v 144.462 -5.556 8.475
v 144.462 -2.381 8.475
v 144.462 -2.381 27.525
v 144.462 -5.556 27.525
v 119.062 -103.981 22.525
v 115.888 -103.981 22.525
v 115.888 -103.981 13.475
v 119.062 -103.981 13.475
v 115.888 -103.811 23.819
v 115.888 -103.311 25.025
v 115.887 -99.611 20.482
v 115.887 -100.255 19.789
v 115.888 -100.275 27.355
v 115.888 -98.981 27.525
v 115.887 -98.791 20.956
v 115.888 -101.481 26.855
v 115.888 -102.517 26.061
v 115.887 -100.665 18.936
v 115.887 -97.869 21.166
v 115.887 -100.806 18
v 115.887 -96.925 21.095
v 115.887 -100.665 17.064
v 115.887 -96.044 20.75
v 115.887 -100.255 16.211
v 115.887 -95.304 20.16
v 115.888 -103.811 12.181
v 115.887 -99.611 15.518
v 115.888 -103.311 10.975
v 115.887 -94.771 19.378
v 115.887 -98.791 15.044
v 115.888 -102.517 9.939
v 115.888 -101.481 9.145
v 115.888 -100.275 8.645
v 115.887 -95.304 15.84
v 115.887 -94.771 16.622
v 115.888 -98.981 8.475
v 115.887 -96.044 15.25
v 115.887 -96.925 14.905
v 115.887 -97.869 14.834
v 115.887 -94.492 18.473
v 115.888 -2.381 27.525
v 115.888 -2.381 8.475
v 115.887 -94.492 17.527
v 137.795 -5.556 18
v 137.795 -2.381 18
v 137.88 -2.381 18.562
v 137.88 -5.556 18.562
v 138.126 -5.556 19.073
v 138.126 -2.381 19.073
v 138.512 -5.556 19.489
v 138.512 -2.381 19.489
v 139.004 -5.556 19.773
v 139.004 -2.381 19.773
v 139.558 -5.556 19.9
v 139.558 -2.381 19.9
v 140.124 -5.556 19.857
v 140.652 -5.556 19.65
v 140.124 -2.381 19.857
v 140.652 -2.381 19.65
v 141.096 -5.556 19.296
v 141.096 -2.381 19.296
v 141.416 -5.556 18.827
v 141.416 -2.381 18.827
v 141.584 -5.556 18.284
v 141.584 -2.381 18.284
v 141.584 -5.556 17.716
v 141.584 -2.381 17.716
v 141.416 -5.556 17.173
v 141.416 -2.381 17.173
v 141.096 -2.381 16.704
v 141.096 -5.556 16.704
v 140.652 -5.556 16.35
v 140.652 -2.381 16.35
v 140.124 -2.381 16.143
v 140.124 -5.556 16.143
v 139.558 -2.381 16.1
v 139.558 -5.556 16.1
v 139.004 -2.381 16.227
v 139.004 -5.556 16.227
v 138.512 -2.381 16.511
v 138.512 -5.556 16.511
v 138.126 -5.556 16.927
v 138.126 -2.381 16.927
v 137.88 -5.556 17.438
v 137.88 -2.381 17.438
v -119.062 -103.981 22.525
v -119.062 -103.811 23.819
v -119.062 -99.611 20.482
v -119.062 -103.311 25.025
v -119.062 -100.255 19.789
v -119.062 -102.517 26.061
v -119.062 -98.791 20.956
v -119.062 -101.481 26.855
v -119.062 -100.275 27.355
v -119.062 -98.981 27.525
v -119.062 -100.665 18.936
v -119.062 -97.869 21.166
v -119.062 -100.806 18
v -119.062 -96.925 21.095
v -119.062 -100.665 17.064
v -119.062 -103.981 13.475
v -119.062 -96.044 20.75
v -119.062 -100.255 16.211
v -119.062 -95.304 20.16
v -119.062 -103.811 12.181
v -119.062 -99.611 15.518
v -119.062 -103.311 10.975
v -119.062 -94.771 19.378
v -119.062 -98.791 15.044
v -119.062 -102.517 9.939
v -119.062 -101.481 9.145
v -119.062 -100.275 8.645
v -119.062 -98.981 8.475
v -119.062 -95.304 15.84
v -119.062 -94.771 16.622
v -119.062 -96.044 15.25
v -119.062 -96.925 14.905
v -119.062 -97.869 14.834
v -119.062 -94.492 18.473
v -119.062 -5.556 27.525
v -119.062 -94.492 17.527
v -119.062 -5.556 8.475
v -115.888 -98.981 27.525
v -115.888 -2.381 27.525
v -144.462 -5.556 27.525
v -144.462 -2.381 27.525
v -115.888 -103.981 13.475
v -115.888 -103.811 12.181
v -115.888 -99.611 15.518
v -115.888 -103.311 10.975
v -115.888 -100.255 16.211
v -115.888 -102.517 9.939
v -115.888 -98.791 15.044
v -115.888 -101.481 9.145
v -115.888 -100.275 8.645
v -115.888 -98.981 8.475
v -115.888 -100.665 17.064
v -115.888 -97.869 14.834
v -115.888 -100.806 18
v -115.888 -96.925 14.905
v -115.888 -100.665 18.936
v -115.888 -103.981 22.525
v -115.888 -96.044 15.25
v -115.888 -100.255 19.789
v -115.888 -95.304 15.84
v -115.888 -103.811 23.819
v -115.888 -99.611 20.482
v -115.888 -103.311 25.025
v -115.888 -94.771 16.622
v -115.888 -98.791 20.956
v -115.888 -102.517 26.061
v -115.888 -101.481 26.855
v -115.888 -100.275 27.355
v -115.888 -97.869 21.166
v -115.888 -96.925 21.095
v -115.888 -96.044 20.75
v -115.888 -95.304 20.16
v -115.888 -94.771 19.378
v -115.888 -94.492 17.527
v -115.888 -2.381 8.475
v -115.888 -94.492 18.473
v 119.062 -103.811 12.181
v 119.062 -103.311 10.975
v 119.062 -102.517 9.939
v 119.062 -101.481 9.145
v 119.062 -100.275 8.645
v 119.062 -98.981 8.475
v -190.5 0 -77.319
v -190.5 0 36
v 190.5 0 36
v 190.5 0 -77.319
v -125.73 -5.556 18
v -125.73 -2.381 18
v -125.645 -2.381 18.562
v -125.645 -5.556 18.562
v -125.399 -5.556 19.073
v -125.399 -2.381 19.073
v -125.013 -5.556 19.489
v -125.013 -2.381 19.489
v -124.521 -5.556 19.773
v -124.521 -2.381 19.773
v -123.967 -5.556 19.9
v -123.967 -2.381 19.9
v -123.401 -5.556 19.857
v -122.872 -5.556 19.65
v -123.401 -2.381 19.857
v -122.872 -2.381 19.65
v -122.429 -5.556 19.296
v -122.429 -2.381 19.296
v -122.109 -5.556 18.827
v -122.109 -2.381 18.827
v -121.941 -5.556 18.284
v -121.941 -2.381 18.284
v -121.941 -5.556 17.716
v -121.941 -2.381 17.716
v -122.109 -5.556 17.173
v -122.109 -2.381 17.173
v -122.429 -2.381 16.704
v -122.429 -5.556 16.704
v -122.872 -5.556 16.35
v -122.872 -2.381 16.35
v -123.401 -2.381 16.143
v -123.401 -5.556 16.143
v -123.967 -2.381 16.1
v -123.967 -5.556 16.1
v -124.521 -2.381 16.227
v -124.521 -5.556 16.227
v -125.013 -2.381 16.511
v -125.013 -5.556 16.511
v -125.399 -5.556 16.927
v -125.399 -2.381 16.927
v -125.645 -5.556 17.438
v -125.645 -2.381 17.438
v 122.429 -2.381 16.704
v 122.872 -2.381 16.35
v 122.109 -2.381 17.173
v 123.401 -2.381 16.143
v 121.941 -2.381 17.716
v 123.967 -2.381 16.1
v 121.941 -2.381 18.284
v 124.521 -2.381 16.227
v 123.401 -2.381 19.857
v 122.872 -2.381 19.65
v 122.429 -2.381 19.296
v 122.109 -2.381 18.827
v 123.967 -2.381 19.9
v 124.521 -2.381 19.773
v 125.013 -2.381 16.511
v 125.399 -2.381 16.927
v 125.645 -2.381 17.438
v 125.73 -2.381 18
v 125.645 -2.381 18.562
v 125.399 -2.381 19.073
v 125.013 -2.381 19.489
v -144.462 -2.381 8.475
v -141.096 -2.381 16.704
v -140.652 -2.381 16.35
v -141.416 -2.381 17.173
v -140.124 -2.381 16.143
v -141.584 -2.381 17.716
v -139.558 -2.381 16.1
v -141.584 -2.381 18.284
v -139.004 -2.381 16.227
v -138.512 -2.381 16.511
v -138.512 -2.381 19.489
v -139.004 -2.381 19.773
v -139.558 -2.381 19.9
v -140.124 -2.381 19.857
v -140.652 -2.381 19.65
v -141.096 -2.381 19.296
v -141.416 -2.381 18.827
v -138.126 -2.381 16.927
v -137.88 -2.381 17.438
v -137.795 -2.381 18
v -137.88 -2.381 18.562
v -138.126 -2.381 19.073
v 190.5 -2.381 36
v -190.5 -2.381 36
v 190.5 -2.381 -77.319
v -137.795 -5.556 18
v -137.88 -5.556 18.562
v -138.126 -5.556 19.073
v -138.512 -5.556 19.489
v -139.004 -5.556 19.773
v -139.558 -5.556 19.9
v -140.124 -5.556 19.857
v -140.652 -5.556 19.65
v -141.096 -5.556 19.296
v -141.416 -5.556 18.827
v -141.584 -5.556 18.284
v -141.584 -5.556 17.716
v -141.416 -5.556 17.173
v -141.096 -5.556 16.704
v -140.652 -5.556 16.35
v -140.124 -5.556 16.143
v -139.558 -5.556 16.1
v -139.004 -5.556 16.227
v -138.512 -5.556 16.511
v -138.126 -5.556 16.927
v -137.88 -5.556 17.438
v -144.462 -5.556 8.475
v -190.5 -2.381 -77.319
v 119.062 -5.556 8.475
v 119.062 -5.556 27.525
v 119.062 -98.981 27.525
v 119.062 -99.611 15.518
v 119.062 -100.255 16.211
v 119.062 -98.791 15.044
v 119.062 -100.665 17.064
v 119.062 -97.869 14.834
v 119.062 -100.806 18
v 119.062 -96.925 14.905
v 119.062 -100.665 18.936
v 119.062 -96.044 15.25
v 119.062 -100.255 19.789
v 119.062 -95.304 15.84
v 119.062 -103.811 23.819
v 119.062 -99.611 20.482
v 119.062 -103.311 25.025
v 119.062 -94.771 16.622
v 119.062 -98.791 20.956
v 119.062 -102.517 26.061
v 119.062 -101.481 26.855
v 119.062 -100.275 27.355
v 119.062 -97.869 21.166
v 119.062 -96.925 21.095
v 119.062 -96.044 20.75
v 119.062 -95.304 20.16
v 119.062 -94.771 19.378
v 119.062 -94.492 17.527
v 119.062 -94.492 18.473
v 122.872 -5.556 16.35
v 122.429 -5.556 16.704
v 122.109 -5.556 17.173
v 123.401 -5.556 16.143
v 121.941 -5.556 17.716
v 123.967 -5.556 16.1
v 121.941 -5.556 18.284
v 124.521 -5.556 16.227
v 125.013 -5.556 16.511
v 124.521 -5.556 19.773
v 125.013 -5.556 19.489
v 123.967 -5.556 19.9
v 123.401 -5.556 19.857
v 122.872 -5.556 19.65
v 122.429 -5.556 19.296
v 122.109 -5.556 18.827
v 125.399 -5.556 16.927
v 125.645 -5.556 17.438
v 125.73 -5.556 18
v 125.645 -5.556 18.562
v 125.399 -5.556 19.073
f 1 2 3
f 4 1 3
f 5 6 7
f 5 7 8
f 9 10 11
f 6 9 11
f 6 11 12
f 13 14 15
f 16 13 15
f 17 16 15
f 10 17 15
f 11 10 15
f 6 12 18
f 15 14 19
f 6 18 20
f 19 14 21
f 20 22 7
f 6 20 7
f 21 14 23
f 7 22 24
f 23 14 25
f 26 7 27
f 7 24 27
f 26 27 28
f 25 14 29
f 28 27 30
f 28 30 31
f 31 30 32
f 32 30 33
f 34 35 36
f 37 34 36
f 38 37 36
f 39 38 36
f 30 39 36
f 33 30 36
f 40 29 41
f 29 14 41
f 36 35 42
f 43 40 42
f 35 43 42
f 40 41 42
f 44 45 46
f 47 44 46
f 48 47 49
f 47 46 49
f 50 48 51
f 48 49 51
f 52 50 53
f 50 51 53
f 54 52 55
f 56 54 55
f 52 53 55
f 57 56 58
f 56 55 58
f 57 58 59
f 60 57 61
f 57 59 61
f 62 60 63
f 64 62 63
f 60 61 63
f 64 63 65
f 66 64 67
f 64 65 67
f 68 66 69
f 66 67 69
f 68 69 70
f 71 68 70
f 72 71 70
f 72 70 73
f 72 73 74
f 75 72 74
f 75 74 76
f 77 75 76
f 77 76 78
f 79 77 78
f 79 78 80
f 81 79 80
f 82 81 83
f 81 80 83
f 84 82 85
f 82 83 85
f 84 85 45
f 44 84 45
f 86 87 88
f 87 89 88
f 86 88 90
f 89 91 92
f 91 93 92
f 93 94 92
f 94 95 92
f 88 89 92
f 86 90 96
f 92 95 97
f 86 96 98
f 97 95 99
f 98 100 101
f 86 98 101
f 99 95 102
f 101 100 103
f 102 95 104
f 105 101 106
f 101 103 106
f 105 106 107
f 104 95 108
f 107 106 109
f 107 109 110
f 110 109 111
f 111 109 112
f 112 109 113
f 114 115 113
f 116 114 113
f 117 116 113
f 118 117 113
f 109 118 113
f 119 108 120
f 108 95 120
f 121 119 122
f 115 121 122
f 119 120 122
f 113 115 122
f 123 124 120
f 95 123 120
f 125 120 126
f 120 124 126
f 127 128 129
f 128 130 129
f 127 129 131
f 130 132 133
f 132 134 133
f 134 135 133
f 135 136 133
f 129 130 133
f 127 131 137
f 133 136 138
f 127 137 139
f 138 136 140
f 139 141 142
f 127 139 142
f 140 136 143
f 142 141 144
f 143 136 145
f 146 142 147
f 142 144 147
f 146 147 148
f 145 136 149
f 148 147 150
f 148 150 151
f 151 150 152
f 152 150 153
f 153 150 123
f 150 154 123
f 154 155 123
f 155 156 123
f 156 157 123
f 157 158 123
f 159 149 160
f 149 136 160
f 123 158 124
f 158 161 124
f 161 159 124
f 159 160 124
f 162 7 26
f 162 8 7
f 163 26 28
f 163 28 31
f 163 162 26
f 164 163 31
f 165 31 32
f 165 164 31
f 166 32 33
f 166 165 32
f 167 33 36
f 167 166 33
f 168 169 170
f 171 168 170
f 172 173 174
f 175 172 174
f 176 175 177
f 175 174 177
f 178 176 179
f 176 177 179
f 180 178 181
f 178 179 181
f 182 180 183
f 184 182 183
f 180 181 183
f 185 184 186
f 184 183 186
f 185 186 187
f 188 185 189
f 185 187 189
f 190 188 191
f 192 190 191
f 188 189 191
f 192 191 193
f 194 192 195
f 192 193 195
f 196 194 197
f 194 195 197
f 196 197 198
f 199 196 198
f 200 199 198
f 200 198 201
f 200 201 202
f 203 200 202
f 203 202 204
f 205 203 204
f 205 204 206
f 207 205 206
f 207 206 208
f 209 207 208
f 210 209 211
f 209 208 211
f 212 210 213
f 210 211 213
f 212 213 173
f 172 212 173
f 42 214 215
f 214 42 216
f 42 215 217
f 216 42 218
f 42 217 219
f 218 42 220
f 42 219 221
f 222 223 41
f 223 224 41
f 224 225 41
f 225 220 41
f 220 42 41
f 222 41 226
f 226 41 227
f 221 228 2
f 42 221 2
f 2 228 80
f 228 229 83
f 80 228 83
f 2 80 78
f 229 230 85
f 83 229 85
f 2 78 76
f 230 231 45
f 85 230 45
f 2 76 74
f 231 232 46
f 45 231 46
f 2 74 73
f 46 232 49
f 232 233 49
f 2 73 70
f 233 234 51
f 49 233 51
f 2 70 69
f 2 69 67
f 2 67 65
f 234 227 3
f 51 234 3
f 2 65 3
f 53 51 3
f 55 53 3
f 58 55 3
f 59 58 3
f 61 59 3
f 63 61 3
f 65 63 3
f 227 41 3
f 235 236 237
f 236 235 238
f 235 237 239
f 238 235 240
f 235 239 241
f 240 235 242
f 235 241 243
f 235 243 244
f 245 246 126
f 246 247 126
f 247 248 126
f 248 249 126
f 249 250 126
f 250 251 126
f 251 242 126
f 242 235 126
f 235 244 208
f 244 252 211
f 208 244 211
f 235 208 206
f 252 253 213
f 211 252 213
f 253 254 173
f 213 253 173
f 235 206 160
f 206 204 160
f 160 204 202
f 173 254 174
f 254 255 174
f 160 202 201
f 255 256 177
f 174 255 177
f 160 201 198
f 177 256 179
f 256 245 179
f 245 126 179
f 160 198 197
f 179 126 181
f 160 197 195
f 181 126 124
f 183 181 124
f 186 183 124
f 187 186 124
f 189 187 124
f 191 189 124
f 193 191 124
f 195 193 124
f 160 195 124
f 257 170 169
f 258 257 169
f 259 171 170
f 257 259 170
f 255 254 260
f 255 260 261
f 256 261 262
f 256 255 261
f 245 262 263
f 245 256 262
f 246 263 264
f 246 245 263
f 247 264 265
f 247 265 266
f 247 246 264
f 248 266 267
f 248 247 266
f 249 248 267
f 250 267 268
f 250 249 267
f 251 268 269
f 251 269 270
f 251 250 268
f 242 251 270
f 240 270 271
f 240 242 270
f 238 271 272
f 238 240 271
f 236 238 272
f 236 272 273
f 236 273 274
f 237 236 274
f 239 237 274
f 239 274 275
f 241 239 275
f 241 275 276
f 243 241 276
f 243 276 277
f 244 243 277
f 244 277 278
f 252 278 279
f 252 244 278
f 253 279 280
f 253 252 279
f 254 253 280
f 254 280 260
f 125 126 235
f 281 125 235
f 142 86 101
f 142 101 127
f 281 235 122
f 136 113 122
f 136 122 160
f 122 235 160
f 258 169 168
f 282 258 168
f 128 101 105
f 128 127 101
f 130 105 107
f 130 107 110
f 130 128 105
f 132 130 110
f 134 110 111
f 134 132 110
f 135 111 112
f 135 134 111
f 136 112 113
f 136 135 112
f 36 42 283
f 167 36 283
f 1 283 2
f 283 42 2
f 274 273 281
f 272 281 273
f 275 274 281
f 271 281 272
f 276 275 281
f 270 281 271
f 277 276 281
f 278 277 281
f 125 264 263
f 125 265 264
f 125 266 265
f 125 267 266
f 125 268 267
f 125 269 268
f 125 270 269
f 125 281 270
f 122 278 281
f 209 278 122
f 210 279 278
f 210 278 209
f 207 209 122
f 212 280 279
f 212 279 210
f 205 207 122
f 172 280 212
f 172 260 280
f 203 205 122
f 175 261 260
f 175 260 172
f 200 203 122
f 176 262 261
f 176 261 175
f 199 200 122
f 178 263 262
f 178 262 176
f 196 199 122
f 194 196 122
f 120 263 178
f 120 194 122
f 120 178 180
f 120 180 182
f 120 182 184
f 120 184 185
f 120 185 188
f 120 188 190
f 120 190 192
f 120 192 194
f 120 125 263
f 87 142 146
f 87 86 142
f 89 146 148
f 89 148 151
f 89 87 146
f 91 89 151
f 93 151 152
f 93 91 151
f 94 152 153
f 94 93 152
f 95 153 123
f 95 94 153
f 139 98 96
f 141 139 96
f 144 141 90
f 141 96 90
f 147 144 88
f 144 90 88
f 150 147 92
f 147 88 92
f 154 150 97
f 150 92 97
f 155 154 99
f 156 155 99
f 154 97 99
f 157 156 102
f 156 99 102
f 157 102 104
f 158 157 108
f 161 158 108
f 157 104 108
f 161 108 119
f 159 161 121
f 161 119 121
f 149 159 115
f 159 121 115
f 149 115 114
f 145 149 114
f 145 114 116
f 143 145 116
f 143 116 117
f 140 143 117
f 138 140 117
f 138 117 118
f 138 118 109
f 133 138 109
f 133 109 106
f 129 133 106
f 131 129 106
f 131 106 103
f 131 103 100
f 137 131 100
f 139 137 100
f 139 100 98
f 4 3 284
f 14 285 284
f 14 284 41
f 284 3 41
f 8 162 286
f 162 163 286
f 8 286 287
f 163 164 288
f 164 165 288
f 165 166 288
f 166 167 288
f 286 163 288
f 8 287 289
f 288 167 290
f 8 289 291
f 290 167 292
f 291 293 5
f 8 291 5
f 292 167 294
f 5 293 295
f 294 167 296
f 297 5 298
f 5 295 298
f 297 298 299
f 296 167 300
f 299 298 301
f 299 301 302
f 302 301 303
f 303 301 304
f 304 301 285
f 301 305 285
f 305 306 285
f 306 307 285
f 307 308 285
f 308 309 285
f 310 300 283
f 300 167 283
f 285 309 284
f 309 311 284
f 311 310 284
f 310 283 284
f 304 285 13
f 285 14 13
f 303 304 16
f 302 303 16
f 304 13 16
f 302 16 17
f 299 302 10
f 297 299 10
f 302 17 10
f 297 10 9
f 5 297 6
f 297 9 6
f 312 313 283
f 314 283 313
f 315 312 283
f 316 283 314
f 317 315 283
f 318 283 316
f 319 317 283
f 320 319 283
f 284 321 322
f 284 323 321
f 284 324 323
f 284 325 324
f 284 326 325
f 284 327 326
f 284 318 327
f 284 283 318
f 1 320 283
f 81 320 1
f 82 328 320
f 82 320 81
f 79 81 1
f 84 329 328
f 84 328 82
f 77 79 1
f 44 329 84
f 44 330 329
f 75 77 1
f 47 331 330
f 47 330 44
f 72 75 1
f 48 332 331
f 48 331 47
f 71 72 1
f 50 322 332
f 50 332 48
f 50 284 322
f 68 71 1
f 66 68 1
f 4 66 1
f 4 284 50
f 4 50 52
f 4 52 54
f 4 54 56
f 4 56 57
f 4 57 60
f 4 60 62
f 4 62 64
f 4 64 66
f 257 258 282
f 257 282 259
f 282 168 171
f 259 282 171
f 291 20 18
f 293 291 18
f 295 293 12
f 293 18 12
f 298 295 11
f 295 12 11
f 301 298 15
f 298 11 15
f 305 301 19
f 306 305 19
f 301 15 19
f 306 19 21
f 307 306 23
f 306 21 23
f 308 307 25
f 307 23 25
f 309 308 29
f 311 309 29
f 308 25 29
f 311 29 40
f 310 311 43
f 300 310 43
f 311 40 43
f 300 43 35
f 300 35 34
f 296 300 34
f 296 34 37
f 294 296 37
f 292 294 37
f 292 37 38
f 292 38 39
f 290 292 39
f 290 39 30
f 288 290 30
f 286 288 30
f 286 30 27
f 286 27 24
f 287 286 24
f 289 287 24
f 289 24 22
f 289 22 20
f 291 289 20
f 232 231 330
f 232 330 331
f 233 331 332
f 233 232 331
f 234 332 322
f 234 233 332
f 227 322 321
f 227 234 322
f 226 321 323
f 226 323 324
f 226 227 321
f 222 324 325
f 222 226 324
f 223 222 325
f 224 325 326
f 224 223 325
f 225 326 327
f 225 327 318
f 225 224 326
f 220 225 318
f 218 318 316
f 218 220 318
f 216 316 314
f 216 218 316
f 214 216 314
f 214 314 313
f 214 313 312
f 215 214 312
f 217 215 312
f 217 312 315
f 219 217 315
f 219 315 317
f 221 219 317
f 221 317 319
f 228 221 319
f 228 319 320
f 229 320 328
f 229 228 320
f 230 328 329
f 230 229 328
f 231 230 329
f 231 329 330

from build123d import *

# Parameters (mm, degrees)
F1_DEPTH  = 2.38125
F3_DEPTH  = 101.6
F5_DEPTH  = 25000
F6_R      = 5
F7_R      = 5
F8_R      = 5
F9_R      = 1.905
F10_DEPTH = 3.175


# Not quite as in the source:
# - a length typed as a fraction of an inch, garbled in the dataset ("3 / 203.2 mm" for 3/8 in), is restored


with BuildPart() as f1:
    # F0 (on Front) → F1 (new body)
    with BuildSketch(Plane.XZ):
        Polygon((190.5, -36), (190.5, 36), (-190.5, 36), (-190.5, -36), (-190.5, -77.319), (190.5, -77.319), align=None)
    extrude(amount=F1_DEPTH)


with BuildPart() as f3:
    # F2 (on face) → F3 (new body)
    with BuildSketch(Plane.XZ.offset(2.38125)):
        Polygon((115.8875, 27.525), (115.8875, 18), (115.8875, 8.475), (119.0625, 8.475), (119.0625, 18), (119.0625, 27.525), align=None)
    extrude(amount=F3_DEPTH)


with BuildPart() as f3b:
    # F2 (on face) → F3, piece 2 (new body)
    with BuildSketch(Plane.XZ.offset(2.38125)):
        Polygon((-115.8875, 8.475), (-115.8875, 18), (-115.8875, 27.525), (-119.0625, 27.525), (-119.0625, 18), (-119.0625, 8.475), align=None)
    extrude(amount=F3_DEPTH)


with BuildPart() as f5_tool:
    # F4 (on face) → F5 (new body)
    with BuildSketch(Plane(origin=(-119.0625, 0, 0), x_dir=(0, -1, 0), z_dir=(-1, 0, 0))):
        with BuildLine():
            ThreePointArc((94.45625, 18), (97.63125, 14.825), (100.80625, 18))
            ThreePointArc((100.80625, 18), (97.63125, 21.175), (94.45625, 18))
        make_face()
    extrude(amount=-F5_DEPTH)


with BuildPart() as f3_1:
    add(f3.part)

    # F5: cut by f5_tool
    add(f5_tool.part, mode=Mode.SUBTRACT)

    # F8
    f8_edges = [f3_1.edges().sort_by_distance(p)[0] for p in [
        (117.475, -103.98125, 27.525),
        (117.475, -103.98125, 8.475),
    ]]
    fillet(f8_edges, radius=F8_R)

    # F9 (on face) → F10, piece 2 (join)
    with BuildSketch(Plane.XZ.offset(2.38125)):
        Polygon((119.0625, 18), (119.0625, 8.475), (131.7625, 8.475), (131.7625, 18), (131.7625, 27.525), (119.0625, 27.525), align=None)
        with Locations((123.825, 18)):
            Circle(F9_R, mode=Mode.SUBTRACT)
        Polygon((131.7625, 18), (131.7625, 8.475), (144.4625, 8.475), (144.4625, 27.525), (131.7625, 27.525), align=None)
        with BuildLine():
            ThreePointArc((141.605, 18), (139.7, 16.095), (137.795, 18))
            ThreePointArc((137.795, 18), (139.7, 19.905), (141.605, 18))
        make_face(mode=Mode.SUBTRACT)
    extrude(amount=F10_DEPTH)


with BuildPart() as f3b_1:
    add(f3b.part)

    # F5: cut by f5_tool
    add(f5_tool.part, mode=Mode.SUBTRACT)

    # F6
    f6_edges = [f3b_1.edges().sort_by_distance(p)[0] for p in [
        (-117.475, -103.98125, 27.525),
    ]]
    fillet(f6_edges, radius=F6_R)

    # F7
    f7_edges = [f3b_1.edges().sort_by_distance(p)[0] for p in [
        (-117.475, -103.98125, 8.475),
    ]]
    fillet(f7_edges, radius=F7_R)

    # F9 (on face) → F10 (join)
    with BuildSketch(Plane.XZ.offset(2.38125)):
        Polygon((-131.7625, 8.475), (-119.0625, 8.475), (-119.0625, 18), (-119.0625, 27.525), (-131.7625, 27.525), (-131.7625, 18), align=None)
        with BuildLine():
            ThreePointArc((-121.92, 18), (-123.825, 16.095), (-125.73, 18))
            ThreePointArc((-125.73, 18), (-123.825, 19.905), (-121.92, 18))
        make_face(mode=Mode.SUBTRACT)
        Polygon((-144.4625, 8.475), (-131.7625, 8.475), (-131.7625, 18), (-131.7625, 27.525), (-144.4625, 27.525), align=None)
        with Locations((-139.7, 18)):
            Circle(F9_R, mode=Mode.SUBTRACT)
    extrude(amount=F10_DEPTH)


solid = Compound([f1.part, f3_1.part, f3b_1.part])
